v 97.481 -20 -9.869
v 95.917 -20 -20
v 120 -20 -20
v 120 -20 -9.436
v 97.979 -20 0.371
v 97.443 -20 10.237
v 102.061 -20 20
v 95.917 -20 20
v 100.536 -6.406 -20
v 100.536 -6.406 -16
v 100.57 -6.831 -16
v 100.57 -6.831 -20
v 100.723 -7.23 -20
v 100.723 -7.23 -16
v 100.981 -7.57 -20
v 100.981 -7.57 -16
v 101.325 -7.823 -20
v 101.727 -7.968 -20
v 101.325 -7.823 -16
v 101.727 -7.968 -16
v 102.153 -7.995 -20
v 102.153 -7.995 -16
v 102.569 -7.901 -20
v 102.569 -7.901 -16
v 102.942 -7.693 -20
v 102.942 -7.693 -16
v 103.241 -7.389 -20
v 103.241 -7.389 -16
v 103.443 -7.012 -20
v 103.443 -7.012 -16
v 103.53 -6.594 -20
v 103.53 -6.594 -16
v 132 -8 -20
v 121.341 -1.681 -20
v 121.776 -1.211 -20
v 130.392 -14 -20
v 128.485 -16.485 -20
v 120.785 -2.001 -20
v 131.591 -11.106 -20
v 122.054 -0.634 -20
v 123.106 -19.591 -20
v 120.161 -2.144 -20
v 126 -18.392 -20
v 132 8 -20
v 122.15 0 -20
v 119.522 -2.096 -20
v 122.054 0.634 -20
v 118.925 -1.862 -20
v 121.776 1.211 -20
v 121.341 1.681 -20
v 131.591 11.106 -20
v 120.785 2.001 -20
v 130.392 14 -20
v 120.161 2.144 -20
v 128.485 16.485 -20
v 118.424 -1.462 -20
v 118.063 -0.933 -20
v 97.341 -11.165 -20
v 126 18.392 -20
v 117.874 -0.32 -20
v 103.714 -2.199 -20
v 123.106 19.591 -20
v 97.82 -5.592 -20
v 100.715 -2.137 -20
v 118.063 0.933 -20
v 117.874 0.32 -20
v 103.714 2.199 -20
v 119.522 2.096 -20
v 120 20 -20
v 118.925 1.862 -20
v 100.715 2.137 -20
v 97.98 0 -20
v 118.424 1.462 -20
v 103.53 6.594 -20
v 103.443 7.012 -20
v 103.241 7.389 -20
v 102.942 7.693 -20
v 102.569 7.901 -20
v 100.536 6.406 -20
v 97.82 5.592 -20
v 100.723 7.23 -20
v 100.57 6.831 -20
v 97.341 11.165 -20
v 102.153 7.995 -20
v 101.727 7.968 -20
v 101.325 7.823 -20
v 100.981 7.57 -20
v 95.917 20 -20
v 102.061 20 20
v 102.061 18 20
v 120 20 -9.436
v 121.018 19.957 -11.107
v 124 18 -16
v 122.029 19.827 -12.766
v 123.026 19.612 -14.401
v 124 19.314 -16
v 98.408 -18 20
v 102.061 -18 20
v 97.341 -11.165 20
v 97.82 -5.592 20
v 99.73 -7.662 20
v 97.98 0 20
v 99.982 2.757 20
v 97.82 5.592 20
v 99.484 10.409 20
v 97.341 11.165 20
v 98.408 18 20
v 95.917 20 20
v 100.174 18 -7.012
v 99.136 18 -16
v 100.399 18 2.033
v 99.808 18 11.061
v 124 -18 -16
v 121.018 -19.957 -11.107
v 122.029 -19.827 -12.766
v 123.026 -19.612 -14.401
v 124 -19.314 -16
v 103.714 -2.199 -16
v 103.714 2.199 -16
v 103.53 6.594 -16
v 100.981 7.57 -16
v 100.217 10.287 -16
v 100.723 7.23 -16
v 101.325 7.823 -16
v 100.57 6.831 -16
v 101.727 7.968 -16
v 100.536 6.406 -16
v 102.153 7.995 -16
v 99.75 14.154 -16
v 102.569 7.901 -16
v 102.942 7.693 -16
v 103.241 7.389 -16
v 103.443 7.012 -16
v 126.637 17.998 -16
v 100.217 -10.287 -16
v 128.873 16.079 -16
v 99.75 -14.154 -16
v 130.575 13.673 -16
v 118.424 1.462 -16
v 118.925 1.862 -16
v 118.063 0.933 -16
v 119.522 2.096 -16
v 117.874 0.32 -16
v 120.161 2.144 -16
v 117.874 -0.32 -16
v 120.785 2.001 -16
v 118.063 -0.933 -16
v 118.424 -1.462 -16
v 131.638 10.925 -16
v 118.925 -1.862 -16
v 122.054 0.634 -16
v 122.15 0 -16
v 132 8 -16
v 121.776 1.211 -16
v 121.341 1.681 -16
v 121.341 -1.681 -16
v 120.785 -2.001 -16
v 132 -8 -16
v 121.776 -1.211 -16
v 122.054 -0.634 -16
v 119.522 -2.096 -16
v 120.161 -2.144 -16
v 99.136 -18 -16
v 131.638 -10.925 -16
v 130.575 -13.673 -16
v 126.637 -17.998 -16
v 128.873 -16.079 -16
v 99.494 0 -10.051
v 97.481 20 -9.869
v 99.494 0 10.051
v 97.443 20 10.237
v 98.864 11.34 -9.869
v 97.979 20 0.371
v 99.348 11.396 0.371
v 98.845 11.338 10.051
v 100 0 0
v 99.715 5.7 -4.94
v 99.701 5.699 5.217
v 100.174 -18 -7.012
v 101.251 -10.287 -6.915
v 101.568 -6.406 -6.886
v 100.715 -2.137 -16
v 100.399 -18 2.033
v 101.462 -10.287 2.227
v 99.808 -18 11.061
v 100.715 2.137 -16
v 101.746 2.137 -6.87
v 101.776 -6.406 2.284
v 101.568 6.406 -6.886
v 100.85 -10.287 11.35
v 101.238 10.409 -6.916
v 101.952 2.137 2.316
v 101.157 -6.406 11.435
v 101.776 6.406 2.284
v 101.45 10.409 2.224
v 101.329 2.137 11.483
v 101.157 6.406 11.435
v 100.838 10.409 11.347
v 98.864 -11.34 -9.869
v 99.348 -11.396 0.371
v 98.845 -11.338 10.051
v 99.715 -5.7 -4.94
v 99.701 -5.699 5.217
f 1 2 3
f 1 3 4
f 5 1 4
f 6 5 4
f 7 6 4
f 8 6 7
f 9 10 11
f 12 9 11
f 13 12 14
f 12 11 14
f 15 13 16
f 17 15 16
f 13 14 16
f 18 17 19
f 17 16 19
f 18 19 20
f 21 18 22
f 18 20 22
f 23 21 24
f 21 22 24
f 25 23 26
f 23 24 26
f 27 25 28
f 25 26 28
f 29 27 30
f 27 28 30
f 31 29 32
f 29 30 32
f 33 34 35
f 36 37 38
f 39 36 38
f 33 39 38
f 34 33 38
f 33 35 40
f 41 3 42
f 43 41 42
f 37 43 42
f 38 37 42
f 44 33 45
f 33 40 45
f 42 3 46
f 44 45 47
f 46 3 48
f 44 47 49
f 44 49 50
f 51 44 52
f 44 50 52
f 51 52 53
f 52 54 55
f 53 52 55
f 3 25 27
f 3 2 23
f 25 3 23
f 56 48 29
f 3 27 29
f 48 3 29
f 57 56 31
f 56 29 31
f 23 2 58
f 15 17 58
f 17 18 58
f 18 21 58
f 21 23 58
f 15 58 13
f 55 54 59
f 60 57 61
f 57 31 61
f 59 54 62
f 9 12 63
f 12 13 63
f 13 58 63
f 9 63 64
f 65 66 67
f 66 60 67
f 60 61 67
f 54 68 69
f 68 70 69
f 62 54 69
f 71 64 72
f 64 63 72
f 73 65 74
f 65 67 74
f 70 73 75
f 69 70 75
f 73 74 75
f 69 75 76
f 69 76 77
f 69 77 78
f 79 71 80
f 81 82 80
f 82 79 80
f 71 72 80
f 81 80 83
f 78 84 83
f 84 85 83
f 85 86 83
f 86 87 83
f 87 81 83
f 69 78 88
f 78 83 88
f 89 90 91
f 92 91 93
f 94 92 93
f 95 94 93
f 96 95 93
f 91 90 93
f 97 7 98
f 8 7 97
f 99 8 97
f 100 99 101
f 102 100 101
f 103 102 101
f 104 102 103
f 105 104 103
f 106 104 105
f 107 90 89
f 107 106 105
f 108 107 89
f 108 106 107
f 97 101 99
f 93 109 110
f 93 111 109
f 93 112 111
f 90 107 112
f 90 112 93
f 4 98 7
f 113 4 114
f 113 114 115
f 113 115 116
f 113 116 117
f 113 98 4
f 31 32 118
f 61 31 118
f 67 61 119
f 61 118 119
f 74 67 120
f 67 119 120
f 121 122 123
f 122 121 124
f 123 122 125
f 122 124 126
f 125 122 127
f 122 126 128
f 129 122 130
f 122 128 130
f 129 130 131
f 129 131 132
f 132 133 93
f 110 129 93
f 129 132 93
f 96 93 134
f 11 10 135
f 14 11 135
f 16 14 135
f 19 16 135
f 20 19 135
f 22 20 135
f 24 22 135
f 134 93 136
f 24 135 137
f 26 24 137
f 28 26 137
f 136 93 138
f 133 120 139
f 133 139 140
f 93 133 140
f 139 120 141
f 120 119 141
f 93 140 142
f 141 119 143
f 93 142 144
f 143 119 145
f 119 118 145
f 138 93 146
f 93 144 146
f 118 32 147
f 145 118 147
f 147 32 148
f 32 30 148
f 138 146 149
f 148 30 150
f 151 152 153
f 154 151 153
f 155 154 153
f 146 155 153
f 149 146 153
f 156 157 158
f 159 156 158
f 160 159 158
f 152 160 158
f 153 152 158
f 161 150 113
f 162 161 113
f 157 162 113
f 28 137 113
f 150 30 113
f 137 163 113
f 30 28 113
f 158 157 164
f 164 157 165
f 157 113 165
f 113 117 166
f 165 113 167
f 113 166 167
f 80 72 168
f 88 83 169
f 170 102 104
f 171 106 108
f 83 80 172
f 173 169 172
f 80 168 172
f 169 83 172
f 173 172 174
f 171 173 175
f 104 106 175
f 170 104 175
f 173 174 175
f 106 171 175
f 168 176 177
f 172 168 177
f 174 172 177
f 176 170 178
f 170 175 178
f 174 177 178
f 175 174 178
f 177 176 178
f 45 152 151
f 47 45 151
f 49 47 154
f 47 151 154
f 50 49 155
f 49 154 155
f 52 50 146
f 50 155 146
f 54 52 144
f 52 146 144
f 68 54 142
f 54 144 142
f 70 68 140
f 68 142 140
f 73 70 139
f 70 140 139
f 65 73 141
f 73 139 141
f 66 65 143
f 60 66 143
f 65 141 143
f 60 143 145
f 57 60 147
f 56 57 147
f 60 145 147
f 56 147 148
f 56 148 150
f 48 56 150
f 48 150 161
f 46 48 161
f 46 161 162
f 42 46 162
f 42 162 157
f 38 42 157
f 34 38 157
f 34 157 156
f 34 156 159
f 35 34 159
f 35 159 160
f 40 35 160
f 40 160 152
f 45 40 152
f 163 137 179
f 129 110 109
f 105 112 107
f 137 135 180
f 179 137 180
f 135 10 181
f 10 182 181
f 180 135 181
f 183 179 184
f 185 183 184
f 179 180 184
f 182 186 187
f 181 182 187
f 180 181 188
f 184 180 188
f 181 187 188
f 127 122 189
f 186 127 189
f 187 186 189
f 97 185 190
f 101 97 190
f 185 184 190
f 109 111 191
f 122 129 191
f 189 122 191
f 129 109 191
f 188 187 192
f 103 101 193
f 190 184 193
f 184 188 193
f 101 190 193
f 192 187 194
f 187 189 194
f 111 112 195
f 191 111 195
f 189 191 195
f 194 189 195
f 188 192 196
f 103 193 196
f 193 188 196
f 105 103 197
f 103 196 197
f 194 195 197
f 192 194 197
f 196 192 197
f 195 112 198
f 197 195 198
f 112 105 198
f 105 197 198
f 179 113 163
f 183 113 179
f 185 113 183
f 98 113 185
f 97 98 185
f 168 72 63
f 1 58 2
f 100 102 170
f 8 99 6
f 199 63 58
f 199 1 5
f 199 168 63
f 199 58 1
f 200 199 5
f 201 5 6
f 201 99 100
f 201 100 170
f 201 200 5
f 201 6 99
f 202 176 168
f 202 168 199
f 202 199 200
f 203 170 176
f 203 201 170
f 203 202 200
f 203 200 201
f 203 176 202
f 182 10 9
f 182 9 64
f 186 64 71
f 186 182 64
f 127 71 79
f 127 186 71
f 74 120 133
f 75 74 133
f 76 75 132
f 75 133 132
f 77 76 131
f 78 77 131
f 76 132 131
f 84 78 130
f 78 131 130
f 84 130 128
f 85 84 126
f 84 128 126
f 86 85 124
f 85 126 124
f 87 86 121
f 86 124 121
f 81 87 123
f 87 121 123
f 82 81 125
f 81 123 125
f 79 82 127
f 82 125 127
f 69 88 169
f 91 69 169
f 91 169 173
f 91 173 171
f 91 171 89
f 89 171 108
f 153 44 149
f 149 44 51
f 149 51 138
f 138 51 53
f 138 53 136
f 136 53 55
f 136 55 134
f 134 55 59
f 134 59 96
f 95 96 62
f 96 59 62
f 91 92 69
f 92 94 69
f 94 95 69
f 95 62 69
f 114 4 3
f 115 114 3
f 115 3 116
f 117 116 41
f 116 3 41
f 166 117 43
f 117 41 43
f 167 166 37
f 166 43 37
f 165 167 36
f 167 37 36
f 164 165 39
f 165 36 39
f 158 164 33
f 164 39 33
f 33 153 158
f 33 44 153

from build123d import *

# Parameters (mm, degrees)
REVOLUTION_ANGLE     = -45
SKETCH001_W          = 200
SKETCH001_H          = 100
SKETCH001_W_2        = 40
SKETCH001_H_2        = 40
POCKET_DEPTH         = 146.825584
SKETCH002_R          = 2.15
POCKET001_DEPTH      = 20.001
POCKET001_DEPTH_BACK = -20.001
GROOVE_ANGLE         = -60
POCKET002_DEPTH      = 20.001
POCKET002_DEPTH_BACK = -20.001
POCKET003_DEPTH      = 4.001


with BuildPart() as part:
    # Sketch → Revolution (revolve, symmetric)
    with BuildSketch(Plane.XZ) as revolution_sk:
        with BuildLine():
            ThreePointArc((96.824584, -25), (100, 0), (96.824584, 25))
            Line((96.824584, 25), (146.824584, 25))
            Line((146.824584, 25), (146.824584, -25))
            Line((146.824584, -25), (96.824584, -25))
        make_face()
    revolve(axis=Axis((0, 0, 0), (0, 0, 1)), revolution_arc=REVOLUTION_ANGLE / 2)
    revolve(revolution_sk.sketch, axis=Axis((0, 0, 0), (0, 0, -1)), revolution_arc=REVOLUTION_ANGLE / 2)

    # Sketch001 → Pocket (cut, through all)
    with BuildSketch(Plane.YZ):
        Rectangle(SKETCH001_W, SKETCH001_H)
        Rectangle(SKETCH001_W_2, SKETCH001_H_2, mode=Mode.SUBTRACT)
    extrude(amount=POCKET_DEPTH, mode=Mode.SUBTRACT)

    # Sketch002 → Pocket001 (cut, two sides)
    with BuildSketch(Plane.XY) as pocket001_sk:
        with Locations((120, 0)):
            Circle(SKETCH002_R)
        with BuildLine():
            Line((120, 20), (120, 30))
            Line((120, 30), (150, 30))
            Line((150, 30), (150, -30))
            Line((150, -30), (120, -30))
            Line((120, -30), (120, -20))
            ThreePointArc((120, -20), (128.485281, -16.485281), (132, -8))
            Line((132, 8), (132, -8))
            ThreePointArc((132, 8), (128.485281, 16.485281), (120, 20))
        make_face()
    extrude(amount=-POCKET001_DEPTH, mode=Mode.SUBTRACT)
    extrude(pocket001_sk.sketch, amount=-POCKET001_DEPTH_BACK, mode=Mode.SUBTRACT)

    # Sketch003 → Groove (revolve, cut)
    with BuildSketch(Plane.XY.offset(-16)):
        with BuildLine():
            Line((159.136485, -18), (159.136485, 18))
            Line((159.136485, 18), (99.136485, 18))
            ThreePointArc((99.136485, -18), (100.737282, 0), (99.136485, 18))
            Line((99.136485, -18), (159.136485, -18))
        make_face()
    revolve(axis=Axis((0, 0, 0), (0, 1, 0)), revolution_arc=GROOVE_ANGLE, mode=Mode.SUBTRACT)

    # Sketch004 → Pocket002 (cut, two sides)
    with BuildSketch(Plane.XZ) as pocket002_sk:
        Polygon((102, 20.1), (124, -16), (154, -16), (154, 30.1), (102, 30.1), align=None)
    extrude(amount=-POCKET002_DEPTH, mode=Mode.SUBTRACT)
    extrude(pocket002_sk.sketch, amount=-POCKET002_DEPTH_BACK, mode=Mode.SUBTRACT)

    # Sketch005 → Pocket003 (cut, through all)
    with BuildSketch(Plane.XY.offset(-16)):
        with BuildLine():
            ThreePointArc((100.535935, -6.405797), (100.737282, 0), (100.535935, 6.405797))
            ThreePointArc((103.530013, 6.594203), (101.938771, 7.997039), (100.535935, 6.405797))
            ThreePointArc((103.530013, -6.594203), (103.737282, 0), (103.530013, 6.594203))
            ThreePointArc((100.535935, -6.405797), (101.938771, -7.997039), (103.530013, -6.594203))
        make_face()
    extrude(amount=-POCKET003_DEPTH, mode=Mode.SUBTRACT)


solid = part.part
